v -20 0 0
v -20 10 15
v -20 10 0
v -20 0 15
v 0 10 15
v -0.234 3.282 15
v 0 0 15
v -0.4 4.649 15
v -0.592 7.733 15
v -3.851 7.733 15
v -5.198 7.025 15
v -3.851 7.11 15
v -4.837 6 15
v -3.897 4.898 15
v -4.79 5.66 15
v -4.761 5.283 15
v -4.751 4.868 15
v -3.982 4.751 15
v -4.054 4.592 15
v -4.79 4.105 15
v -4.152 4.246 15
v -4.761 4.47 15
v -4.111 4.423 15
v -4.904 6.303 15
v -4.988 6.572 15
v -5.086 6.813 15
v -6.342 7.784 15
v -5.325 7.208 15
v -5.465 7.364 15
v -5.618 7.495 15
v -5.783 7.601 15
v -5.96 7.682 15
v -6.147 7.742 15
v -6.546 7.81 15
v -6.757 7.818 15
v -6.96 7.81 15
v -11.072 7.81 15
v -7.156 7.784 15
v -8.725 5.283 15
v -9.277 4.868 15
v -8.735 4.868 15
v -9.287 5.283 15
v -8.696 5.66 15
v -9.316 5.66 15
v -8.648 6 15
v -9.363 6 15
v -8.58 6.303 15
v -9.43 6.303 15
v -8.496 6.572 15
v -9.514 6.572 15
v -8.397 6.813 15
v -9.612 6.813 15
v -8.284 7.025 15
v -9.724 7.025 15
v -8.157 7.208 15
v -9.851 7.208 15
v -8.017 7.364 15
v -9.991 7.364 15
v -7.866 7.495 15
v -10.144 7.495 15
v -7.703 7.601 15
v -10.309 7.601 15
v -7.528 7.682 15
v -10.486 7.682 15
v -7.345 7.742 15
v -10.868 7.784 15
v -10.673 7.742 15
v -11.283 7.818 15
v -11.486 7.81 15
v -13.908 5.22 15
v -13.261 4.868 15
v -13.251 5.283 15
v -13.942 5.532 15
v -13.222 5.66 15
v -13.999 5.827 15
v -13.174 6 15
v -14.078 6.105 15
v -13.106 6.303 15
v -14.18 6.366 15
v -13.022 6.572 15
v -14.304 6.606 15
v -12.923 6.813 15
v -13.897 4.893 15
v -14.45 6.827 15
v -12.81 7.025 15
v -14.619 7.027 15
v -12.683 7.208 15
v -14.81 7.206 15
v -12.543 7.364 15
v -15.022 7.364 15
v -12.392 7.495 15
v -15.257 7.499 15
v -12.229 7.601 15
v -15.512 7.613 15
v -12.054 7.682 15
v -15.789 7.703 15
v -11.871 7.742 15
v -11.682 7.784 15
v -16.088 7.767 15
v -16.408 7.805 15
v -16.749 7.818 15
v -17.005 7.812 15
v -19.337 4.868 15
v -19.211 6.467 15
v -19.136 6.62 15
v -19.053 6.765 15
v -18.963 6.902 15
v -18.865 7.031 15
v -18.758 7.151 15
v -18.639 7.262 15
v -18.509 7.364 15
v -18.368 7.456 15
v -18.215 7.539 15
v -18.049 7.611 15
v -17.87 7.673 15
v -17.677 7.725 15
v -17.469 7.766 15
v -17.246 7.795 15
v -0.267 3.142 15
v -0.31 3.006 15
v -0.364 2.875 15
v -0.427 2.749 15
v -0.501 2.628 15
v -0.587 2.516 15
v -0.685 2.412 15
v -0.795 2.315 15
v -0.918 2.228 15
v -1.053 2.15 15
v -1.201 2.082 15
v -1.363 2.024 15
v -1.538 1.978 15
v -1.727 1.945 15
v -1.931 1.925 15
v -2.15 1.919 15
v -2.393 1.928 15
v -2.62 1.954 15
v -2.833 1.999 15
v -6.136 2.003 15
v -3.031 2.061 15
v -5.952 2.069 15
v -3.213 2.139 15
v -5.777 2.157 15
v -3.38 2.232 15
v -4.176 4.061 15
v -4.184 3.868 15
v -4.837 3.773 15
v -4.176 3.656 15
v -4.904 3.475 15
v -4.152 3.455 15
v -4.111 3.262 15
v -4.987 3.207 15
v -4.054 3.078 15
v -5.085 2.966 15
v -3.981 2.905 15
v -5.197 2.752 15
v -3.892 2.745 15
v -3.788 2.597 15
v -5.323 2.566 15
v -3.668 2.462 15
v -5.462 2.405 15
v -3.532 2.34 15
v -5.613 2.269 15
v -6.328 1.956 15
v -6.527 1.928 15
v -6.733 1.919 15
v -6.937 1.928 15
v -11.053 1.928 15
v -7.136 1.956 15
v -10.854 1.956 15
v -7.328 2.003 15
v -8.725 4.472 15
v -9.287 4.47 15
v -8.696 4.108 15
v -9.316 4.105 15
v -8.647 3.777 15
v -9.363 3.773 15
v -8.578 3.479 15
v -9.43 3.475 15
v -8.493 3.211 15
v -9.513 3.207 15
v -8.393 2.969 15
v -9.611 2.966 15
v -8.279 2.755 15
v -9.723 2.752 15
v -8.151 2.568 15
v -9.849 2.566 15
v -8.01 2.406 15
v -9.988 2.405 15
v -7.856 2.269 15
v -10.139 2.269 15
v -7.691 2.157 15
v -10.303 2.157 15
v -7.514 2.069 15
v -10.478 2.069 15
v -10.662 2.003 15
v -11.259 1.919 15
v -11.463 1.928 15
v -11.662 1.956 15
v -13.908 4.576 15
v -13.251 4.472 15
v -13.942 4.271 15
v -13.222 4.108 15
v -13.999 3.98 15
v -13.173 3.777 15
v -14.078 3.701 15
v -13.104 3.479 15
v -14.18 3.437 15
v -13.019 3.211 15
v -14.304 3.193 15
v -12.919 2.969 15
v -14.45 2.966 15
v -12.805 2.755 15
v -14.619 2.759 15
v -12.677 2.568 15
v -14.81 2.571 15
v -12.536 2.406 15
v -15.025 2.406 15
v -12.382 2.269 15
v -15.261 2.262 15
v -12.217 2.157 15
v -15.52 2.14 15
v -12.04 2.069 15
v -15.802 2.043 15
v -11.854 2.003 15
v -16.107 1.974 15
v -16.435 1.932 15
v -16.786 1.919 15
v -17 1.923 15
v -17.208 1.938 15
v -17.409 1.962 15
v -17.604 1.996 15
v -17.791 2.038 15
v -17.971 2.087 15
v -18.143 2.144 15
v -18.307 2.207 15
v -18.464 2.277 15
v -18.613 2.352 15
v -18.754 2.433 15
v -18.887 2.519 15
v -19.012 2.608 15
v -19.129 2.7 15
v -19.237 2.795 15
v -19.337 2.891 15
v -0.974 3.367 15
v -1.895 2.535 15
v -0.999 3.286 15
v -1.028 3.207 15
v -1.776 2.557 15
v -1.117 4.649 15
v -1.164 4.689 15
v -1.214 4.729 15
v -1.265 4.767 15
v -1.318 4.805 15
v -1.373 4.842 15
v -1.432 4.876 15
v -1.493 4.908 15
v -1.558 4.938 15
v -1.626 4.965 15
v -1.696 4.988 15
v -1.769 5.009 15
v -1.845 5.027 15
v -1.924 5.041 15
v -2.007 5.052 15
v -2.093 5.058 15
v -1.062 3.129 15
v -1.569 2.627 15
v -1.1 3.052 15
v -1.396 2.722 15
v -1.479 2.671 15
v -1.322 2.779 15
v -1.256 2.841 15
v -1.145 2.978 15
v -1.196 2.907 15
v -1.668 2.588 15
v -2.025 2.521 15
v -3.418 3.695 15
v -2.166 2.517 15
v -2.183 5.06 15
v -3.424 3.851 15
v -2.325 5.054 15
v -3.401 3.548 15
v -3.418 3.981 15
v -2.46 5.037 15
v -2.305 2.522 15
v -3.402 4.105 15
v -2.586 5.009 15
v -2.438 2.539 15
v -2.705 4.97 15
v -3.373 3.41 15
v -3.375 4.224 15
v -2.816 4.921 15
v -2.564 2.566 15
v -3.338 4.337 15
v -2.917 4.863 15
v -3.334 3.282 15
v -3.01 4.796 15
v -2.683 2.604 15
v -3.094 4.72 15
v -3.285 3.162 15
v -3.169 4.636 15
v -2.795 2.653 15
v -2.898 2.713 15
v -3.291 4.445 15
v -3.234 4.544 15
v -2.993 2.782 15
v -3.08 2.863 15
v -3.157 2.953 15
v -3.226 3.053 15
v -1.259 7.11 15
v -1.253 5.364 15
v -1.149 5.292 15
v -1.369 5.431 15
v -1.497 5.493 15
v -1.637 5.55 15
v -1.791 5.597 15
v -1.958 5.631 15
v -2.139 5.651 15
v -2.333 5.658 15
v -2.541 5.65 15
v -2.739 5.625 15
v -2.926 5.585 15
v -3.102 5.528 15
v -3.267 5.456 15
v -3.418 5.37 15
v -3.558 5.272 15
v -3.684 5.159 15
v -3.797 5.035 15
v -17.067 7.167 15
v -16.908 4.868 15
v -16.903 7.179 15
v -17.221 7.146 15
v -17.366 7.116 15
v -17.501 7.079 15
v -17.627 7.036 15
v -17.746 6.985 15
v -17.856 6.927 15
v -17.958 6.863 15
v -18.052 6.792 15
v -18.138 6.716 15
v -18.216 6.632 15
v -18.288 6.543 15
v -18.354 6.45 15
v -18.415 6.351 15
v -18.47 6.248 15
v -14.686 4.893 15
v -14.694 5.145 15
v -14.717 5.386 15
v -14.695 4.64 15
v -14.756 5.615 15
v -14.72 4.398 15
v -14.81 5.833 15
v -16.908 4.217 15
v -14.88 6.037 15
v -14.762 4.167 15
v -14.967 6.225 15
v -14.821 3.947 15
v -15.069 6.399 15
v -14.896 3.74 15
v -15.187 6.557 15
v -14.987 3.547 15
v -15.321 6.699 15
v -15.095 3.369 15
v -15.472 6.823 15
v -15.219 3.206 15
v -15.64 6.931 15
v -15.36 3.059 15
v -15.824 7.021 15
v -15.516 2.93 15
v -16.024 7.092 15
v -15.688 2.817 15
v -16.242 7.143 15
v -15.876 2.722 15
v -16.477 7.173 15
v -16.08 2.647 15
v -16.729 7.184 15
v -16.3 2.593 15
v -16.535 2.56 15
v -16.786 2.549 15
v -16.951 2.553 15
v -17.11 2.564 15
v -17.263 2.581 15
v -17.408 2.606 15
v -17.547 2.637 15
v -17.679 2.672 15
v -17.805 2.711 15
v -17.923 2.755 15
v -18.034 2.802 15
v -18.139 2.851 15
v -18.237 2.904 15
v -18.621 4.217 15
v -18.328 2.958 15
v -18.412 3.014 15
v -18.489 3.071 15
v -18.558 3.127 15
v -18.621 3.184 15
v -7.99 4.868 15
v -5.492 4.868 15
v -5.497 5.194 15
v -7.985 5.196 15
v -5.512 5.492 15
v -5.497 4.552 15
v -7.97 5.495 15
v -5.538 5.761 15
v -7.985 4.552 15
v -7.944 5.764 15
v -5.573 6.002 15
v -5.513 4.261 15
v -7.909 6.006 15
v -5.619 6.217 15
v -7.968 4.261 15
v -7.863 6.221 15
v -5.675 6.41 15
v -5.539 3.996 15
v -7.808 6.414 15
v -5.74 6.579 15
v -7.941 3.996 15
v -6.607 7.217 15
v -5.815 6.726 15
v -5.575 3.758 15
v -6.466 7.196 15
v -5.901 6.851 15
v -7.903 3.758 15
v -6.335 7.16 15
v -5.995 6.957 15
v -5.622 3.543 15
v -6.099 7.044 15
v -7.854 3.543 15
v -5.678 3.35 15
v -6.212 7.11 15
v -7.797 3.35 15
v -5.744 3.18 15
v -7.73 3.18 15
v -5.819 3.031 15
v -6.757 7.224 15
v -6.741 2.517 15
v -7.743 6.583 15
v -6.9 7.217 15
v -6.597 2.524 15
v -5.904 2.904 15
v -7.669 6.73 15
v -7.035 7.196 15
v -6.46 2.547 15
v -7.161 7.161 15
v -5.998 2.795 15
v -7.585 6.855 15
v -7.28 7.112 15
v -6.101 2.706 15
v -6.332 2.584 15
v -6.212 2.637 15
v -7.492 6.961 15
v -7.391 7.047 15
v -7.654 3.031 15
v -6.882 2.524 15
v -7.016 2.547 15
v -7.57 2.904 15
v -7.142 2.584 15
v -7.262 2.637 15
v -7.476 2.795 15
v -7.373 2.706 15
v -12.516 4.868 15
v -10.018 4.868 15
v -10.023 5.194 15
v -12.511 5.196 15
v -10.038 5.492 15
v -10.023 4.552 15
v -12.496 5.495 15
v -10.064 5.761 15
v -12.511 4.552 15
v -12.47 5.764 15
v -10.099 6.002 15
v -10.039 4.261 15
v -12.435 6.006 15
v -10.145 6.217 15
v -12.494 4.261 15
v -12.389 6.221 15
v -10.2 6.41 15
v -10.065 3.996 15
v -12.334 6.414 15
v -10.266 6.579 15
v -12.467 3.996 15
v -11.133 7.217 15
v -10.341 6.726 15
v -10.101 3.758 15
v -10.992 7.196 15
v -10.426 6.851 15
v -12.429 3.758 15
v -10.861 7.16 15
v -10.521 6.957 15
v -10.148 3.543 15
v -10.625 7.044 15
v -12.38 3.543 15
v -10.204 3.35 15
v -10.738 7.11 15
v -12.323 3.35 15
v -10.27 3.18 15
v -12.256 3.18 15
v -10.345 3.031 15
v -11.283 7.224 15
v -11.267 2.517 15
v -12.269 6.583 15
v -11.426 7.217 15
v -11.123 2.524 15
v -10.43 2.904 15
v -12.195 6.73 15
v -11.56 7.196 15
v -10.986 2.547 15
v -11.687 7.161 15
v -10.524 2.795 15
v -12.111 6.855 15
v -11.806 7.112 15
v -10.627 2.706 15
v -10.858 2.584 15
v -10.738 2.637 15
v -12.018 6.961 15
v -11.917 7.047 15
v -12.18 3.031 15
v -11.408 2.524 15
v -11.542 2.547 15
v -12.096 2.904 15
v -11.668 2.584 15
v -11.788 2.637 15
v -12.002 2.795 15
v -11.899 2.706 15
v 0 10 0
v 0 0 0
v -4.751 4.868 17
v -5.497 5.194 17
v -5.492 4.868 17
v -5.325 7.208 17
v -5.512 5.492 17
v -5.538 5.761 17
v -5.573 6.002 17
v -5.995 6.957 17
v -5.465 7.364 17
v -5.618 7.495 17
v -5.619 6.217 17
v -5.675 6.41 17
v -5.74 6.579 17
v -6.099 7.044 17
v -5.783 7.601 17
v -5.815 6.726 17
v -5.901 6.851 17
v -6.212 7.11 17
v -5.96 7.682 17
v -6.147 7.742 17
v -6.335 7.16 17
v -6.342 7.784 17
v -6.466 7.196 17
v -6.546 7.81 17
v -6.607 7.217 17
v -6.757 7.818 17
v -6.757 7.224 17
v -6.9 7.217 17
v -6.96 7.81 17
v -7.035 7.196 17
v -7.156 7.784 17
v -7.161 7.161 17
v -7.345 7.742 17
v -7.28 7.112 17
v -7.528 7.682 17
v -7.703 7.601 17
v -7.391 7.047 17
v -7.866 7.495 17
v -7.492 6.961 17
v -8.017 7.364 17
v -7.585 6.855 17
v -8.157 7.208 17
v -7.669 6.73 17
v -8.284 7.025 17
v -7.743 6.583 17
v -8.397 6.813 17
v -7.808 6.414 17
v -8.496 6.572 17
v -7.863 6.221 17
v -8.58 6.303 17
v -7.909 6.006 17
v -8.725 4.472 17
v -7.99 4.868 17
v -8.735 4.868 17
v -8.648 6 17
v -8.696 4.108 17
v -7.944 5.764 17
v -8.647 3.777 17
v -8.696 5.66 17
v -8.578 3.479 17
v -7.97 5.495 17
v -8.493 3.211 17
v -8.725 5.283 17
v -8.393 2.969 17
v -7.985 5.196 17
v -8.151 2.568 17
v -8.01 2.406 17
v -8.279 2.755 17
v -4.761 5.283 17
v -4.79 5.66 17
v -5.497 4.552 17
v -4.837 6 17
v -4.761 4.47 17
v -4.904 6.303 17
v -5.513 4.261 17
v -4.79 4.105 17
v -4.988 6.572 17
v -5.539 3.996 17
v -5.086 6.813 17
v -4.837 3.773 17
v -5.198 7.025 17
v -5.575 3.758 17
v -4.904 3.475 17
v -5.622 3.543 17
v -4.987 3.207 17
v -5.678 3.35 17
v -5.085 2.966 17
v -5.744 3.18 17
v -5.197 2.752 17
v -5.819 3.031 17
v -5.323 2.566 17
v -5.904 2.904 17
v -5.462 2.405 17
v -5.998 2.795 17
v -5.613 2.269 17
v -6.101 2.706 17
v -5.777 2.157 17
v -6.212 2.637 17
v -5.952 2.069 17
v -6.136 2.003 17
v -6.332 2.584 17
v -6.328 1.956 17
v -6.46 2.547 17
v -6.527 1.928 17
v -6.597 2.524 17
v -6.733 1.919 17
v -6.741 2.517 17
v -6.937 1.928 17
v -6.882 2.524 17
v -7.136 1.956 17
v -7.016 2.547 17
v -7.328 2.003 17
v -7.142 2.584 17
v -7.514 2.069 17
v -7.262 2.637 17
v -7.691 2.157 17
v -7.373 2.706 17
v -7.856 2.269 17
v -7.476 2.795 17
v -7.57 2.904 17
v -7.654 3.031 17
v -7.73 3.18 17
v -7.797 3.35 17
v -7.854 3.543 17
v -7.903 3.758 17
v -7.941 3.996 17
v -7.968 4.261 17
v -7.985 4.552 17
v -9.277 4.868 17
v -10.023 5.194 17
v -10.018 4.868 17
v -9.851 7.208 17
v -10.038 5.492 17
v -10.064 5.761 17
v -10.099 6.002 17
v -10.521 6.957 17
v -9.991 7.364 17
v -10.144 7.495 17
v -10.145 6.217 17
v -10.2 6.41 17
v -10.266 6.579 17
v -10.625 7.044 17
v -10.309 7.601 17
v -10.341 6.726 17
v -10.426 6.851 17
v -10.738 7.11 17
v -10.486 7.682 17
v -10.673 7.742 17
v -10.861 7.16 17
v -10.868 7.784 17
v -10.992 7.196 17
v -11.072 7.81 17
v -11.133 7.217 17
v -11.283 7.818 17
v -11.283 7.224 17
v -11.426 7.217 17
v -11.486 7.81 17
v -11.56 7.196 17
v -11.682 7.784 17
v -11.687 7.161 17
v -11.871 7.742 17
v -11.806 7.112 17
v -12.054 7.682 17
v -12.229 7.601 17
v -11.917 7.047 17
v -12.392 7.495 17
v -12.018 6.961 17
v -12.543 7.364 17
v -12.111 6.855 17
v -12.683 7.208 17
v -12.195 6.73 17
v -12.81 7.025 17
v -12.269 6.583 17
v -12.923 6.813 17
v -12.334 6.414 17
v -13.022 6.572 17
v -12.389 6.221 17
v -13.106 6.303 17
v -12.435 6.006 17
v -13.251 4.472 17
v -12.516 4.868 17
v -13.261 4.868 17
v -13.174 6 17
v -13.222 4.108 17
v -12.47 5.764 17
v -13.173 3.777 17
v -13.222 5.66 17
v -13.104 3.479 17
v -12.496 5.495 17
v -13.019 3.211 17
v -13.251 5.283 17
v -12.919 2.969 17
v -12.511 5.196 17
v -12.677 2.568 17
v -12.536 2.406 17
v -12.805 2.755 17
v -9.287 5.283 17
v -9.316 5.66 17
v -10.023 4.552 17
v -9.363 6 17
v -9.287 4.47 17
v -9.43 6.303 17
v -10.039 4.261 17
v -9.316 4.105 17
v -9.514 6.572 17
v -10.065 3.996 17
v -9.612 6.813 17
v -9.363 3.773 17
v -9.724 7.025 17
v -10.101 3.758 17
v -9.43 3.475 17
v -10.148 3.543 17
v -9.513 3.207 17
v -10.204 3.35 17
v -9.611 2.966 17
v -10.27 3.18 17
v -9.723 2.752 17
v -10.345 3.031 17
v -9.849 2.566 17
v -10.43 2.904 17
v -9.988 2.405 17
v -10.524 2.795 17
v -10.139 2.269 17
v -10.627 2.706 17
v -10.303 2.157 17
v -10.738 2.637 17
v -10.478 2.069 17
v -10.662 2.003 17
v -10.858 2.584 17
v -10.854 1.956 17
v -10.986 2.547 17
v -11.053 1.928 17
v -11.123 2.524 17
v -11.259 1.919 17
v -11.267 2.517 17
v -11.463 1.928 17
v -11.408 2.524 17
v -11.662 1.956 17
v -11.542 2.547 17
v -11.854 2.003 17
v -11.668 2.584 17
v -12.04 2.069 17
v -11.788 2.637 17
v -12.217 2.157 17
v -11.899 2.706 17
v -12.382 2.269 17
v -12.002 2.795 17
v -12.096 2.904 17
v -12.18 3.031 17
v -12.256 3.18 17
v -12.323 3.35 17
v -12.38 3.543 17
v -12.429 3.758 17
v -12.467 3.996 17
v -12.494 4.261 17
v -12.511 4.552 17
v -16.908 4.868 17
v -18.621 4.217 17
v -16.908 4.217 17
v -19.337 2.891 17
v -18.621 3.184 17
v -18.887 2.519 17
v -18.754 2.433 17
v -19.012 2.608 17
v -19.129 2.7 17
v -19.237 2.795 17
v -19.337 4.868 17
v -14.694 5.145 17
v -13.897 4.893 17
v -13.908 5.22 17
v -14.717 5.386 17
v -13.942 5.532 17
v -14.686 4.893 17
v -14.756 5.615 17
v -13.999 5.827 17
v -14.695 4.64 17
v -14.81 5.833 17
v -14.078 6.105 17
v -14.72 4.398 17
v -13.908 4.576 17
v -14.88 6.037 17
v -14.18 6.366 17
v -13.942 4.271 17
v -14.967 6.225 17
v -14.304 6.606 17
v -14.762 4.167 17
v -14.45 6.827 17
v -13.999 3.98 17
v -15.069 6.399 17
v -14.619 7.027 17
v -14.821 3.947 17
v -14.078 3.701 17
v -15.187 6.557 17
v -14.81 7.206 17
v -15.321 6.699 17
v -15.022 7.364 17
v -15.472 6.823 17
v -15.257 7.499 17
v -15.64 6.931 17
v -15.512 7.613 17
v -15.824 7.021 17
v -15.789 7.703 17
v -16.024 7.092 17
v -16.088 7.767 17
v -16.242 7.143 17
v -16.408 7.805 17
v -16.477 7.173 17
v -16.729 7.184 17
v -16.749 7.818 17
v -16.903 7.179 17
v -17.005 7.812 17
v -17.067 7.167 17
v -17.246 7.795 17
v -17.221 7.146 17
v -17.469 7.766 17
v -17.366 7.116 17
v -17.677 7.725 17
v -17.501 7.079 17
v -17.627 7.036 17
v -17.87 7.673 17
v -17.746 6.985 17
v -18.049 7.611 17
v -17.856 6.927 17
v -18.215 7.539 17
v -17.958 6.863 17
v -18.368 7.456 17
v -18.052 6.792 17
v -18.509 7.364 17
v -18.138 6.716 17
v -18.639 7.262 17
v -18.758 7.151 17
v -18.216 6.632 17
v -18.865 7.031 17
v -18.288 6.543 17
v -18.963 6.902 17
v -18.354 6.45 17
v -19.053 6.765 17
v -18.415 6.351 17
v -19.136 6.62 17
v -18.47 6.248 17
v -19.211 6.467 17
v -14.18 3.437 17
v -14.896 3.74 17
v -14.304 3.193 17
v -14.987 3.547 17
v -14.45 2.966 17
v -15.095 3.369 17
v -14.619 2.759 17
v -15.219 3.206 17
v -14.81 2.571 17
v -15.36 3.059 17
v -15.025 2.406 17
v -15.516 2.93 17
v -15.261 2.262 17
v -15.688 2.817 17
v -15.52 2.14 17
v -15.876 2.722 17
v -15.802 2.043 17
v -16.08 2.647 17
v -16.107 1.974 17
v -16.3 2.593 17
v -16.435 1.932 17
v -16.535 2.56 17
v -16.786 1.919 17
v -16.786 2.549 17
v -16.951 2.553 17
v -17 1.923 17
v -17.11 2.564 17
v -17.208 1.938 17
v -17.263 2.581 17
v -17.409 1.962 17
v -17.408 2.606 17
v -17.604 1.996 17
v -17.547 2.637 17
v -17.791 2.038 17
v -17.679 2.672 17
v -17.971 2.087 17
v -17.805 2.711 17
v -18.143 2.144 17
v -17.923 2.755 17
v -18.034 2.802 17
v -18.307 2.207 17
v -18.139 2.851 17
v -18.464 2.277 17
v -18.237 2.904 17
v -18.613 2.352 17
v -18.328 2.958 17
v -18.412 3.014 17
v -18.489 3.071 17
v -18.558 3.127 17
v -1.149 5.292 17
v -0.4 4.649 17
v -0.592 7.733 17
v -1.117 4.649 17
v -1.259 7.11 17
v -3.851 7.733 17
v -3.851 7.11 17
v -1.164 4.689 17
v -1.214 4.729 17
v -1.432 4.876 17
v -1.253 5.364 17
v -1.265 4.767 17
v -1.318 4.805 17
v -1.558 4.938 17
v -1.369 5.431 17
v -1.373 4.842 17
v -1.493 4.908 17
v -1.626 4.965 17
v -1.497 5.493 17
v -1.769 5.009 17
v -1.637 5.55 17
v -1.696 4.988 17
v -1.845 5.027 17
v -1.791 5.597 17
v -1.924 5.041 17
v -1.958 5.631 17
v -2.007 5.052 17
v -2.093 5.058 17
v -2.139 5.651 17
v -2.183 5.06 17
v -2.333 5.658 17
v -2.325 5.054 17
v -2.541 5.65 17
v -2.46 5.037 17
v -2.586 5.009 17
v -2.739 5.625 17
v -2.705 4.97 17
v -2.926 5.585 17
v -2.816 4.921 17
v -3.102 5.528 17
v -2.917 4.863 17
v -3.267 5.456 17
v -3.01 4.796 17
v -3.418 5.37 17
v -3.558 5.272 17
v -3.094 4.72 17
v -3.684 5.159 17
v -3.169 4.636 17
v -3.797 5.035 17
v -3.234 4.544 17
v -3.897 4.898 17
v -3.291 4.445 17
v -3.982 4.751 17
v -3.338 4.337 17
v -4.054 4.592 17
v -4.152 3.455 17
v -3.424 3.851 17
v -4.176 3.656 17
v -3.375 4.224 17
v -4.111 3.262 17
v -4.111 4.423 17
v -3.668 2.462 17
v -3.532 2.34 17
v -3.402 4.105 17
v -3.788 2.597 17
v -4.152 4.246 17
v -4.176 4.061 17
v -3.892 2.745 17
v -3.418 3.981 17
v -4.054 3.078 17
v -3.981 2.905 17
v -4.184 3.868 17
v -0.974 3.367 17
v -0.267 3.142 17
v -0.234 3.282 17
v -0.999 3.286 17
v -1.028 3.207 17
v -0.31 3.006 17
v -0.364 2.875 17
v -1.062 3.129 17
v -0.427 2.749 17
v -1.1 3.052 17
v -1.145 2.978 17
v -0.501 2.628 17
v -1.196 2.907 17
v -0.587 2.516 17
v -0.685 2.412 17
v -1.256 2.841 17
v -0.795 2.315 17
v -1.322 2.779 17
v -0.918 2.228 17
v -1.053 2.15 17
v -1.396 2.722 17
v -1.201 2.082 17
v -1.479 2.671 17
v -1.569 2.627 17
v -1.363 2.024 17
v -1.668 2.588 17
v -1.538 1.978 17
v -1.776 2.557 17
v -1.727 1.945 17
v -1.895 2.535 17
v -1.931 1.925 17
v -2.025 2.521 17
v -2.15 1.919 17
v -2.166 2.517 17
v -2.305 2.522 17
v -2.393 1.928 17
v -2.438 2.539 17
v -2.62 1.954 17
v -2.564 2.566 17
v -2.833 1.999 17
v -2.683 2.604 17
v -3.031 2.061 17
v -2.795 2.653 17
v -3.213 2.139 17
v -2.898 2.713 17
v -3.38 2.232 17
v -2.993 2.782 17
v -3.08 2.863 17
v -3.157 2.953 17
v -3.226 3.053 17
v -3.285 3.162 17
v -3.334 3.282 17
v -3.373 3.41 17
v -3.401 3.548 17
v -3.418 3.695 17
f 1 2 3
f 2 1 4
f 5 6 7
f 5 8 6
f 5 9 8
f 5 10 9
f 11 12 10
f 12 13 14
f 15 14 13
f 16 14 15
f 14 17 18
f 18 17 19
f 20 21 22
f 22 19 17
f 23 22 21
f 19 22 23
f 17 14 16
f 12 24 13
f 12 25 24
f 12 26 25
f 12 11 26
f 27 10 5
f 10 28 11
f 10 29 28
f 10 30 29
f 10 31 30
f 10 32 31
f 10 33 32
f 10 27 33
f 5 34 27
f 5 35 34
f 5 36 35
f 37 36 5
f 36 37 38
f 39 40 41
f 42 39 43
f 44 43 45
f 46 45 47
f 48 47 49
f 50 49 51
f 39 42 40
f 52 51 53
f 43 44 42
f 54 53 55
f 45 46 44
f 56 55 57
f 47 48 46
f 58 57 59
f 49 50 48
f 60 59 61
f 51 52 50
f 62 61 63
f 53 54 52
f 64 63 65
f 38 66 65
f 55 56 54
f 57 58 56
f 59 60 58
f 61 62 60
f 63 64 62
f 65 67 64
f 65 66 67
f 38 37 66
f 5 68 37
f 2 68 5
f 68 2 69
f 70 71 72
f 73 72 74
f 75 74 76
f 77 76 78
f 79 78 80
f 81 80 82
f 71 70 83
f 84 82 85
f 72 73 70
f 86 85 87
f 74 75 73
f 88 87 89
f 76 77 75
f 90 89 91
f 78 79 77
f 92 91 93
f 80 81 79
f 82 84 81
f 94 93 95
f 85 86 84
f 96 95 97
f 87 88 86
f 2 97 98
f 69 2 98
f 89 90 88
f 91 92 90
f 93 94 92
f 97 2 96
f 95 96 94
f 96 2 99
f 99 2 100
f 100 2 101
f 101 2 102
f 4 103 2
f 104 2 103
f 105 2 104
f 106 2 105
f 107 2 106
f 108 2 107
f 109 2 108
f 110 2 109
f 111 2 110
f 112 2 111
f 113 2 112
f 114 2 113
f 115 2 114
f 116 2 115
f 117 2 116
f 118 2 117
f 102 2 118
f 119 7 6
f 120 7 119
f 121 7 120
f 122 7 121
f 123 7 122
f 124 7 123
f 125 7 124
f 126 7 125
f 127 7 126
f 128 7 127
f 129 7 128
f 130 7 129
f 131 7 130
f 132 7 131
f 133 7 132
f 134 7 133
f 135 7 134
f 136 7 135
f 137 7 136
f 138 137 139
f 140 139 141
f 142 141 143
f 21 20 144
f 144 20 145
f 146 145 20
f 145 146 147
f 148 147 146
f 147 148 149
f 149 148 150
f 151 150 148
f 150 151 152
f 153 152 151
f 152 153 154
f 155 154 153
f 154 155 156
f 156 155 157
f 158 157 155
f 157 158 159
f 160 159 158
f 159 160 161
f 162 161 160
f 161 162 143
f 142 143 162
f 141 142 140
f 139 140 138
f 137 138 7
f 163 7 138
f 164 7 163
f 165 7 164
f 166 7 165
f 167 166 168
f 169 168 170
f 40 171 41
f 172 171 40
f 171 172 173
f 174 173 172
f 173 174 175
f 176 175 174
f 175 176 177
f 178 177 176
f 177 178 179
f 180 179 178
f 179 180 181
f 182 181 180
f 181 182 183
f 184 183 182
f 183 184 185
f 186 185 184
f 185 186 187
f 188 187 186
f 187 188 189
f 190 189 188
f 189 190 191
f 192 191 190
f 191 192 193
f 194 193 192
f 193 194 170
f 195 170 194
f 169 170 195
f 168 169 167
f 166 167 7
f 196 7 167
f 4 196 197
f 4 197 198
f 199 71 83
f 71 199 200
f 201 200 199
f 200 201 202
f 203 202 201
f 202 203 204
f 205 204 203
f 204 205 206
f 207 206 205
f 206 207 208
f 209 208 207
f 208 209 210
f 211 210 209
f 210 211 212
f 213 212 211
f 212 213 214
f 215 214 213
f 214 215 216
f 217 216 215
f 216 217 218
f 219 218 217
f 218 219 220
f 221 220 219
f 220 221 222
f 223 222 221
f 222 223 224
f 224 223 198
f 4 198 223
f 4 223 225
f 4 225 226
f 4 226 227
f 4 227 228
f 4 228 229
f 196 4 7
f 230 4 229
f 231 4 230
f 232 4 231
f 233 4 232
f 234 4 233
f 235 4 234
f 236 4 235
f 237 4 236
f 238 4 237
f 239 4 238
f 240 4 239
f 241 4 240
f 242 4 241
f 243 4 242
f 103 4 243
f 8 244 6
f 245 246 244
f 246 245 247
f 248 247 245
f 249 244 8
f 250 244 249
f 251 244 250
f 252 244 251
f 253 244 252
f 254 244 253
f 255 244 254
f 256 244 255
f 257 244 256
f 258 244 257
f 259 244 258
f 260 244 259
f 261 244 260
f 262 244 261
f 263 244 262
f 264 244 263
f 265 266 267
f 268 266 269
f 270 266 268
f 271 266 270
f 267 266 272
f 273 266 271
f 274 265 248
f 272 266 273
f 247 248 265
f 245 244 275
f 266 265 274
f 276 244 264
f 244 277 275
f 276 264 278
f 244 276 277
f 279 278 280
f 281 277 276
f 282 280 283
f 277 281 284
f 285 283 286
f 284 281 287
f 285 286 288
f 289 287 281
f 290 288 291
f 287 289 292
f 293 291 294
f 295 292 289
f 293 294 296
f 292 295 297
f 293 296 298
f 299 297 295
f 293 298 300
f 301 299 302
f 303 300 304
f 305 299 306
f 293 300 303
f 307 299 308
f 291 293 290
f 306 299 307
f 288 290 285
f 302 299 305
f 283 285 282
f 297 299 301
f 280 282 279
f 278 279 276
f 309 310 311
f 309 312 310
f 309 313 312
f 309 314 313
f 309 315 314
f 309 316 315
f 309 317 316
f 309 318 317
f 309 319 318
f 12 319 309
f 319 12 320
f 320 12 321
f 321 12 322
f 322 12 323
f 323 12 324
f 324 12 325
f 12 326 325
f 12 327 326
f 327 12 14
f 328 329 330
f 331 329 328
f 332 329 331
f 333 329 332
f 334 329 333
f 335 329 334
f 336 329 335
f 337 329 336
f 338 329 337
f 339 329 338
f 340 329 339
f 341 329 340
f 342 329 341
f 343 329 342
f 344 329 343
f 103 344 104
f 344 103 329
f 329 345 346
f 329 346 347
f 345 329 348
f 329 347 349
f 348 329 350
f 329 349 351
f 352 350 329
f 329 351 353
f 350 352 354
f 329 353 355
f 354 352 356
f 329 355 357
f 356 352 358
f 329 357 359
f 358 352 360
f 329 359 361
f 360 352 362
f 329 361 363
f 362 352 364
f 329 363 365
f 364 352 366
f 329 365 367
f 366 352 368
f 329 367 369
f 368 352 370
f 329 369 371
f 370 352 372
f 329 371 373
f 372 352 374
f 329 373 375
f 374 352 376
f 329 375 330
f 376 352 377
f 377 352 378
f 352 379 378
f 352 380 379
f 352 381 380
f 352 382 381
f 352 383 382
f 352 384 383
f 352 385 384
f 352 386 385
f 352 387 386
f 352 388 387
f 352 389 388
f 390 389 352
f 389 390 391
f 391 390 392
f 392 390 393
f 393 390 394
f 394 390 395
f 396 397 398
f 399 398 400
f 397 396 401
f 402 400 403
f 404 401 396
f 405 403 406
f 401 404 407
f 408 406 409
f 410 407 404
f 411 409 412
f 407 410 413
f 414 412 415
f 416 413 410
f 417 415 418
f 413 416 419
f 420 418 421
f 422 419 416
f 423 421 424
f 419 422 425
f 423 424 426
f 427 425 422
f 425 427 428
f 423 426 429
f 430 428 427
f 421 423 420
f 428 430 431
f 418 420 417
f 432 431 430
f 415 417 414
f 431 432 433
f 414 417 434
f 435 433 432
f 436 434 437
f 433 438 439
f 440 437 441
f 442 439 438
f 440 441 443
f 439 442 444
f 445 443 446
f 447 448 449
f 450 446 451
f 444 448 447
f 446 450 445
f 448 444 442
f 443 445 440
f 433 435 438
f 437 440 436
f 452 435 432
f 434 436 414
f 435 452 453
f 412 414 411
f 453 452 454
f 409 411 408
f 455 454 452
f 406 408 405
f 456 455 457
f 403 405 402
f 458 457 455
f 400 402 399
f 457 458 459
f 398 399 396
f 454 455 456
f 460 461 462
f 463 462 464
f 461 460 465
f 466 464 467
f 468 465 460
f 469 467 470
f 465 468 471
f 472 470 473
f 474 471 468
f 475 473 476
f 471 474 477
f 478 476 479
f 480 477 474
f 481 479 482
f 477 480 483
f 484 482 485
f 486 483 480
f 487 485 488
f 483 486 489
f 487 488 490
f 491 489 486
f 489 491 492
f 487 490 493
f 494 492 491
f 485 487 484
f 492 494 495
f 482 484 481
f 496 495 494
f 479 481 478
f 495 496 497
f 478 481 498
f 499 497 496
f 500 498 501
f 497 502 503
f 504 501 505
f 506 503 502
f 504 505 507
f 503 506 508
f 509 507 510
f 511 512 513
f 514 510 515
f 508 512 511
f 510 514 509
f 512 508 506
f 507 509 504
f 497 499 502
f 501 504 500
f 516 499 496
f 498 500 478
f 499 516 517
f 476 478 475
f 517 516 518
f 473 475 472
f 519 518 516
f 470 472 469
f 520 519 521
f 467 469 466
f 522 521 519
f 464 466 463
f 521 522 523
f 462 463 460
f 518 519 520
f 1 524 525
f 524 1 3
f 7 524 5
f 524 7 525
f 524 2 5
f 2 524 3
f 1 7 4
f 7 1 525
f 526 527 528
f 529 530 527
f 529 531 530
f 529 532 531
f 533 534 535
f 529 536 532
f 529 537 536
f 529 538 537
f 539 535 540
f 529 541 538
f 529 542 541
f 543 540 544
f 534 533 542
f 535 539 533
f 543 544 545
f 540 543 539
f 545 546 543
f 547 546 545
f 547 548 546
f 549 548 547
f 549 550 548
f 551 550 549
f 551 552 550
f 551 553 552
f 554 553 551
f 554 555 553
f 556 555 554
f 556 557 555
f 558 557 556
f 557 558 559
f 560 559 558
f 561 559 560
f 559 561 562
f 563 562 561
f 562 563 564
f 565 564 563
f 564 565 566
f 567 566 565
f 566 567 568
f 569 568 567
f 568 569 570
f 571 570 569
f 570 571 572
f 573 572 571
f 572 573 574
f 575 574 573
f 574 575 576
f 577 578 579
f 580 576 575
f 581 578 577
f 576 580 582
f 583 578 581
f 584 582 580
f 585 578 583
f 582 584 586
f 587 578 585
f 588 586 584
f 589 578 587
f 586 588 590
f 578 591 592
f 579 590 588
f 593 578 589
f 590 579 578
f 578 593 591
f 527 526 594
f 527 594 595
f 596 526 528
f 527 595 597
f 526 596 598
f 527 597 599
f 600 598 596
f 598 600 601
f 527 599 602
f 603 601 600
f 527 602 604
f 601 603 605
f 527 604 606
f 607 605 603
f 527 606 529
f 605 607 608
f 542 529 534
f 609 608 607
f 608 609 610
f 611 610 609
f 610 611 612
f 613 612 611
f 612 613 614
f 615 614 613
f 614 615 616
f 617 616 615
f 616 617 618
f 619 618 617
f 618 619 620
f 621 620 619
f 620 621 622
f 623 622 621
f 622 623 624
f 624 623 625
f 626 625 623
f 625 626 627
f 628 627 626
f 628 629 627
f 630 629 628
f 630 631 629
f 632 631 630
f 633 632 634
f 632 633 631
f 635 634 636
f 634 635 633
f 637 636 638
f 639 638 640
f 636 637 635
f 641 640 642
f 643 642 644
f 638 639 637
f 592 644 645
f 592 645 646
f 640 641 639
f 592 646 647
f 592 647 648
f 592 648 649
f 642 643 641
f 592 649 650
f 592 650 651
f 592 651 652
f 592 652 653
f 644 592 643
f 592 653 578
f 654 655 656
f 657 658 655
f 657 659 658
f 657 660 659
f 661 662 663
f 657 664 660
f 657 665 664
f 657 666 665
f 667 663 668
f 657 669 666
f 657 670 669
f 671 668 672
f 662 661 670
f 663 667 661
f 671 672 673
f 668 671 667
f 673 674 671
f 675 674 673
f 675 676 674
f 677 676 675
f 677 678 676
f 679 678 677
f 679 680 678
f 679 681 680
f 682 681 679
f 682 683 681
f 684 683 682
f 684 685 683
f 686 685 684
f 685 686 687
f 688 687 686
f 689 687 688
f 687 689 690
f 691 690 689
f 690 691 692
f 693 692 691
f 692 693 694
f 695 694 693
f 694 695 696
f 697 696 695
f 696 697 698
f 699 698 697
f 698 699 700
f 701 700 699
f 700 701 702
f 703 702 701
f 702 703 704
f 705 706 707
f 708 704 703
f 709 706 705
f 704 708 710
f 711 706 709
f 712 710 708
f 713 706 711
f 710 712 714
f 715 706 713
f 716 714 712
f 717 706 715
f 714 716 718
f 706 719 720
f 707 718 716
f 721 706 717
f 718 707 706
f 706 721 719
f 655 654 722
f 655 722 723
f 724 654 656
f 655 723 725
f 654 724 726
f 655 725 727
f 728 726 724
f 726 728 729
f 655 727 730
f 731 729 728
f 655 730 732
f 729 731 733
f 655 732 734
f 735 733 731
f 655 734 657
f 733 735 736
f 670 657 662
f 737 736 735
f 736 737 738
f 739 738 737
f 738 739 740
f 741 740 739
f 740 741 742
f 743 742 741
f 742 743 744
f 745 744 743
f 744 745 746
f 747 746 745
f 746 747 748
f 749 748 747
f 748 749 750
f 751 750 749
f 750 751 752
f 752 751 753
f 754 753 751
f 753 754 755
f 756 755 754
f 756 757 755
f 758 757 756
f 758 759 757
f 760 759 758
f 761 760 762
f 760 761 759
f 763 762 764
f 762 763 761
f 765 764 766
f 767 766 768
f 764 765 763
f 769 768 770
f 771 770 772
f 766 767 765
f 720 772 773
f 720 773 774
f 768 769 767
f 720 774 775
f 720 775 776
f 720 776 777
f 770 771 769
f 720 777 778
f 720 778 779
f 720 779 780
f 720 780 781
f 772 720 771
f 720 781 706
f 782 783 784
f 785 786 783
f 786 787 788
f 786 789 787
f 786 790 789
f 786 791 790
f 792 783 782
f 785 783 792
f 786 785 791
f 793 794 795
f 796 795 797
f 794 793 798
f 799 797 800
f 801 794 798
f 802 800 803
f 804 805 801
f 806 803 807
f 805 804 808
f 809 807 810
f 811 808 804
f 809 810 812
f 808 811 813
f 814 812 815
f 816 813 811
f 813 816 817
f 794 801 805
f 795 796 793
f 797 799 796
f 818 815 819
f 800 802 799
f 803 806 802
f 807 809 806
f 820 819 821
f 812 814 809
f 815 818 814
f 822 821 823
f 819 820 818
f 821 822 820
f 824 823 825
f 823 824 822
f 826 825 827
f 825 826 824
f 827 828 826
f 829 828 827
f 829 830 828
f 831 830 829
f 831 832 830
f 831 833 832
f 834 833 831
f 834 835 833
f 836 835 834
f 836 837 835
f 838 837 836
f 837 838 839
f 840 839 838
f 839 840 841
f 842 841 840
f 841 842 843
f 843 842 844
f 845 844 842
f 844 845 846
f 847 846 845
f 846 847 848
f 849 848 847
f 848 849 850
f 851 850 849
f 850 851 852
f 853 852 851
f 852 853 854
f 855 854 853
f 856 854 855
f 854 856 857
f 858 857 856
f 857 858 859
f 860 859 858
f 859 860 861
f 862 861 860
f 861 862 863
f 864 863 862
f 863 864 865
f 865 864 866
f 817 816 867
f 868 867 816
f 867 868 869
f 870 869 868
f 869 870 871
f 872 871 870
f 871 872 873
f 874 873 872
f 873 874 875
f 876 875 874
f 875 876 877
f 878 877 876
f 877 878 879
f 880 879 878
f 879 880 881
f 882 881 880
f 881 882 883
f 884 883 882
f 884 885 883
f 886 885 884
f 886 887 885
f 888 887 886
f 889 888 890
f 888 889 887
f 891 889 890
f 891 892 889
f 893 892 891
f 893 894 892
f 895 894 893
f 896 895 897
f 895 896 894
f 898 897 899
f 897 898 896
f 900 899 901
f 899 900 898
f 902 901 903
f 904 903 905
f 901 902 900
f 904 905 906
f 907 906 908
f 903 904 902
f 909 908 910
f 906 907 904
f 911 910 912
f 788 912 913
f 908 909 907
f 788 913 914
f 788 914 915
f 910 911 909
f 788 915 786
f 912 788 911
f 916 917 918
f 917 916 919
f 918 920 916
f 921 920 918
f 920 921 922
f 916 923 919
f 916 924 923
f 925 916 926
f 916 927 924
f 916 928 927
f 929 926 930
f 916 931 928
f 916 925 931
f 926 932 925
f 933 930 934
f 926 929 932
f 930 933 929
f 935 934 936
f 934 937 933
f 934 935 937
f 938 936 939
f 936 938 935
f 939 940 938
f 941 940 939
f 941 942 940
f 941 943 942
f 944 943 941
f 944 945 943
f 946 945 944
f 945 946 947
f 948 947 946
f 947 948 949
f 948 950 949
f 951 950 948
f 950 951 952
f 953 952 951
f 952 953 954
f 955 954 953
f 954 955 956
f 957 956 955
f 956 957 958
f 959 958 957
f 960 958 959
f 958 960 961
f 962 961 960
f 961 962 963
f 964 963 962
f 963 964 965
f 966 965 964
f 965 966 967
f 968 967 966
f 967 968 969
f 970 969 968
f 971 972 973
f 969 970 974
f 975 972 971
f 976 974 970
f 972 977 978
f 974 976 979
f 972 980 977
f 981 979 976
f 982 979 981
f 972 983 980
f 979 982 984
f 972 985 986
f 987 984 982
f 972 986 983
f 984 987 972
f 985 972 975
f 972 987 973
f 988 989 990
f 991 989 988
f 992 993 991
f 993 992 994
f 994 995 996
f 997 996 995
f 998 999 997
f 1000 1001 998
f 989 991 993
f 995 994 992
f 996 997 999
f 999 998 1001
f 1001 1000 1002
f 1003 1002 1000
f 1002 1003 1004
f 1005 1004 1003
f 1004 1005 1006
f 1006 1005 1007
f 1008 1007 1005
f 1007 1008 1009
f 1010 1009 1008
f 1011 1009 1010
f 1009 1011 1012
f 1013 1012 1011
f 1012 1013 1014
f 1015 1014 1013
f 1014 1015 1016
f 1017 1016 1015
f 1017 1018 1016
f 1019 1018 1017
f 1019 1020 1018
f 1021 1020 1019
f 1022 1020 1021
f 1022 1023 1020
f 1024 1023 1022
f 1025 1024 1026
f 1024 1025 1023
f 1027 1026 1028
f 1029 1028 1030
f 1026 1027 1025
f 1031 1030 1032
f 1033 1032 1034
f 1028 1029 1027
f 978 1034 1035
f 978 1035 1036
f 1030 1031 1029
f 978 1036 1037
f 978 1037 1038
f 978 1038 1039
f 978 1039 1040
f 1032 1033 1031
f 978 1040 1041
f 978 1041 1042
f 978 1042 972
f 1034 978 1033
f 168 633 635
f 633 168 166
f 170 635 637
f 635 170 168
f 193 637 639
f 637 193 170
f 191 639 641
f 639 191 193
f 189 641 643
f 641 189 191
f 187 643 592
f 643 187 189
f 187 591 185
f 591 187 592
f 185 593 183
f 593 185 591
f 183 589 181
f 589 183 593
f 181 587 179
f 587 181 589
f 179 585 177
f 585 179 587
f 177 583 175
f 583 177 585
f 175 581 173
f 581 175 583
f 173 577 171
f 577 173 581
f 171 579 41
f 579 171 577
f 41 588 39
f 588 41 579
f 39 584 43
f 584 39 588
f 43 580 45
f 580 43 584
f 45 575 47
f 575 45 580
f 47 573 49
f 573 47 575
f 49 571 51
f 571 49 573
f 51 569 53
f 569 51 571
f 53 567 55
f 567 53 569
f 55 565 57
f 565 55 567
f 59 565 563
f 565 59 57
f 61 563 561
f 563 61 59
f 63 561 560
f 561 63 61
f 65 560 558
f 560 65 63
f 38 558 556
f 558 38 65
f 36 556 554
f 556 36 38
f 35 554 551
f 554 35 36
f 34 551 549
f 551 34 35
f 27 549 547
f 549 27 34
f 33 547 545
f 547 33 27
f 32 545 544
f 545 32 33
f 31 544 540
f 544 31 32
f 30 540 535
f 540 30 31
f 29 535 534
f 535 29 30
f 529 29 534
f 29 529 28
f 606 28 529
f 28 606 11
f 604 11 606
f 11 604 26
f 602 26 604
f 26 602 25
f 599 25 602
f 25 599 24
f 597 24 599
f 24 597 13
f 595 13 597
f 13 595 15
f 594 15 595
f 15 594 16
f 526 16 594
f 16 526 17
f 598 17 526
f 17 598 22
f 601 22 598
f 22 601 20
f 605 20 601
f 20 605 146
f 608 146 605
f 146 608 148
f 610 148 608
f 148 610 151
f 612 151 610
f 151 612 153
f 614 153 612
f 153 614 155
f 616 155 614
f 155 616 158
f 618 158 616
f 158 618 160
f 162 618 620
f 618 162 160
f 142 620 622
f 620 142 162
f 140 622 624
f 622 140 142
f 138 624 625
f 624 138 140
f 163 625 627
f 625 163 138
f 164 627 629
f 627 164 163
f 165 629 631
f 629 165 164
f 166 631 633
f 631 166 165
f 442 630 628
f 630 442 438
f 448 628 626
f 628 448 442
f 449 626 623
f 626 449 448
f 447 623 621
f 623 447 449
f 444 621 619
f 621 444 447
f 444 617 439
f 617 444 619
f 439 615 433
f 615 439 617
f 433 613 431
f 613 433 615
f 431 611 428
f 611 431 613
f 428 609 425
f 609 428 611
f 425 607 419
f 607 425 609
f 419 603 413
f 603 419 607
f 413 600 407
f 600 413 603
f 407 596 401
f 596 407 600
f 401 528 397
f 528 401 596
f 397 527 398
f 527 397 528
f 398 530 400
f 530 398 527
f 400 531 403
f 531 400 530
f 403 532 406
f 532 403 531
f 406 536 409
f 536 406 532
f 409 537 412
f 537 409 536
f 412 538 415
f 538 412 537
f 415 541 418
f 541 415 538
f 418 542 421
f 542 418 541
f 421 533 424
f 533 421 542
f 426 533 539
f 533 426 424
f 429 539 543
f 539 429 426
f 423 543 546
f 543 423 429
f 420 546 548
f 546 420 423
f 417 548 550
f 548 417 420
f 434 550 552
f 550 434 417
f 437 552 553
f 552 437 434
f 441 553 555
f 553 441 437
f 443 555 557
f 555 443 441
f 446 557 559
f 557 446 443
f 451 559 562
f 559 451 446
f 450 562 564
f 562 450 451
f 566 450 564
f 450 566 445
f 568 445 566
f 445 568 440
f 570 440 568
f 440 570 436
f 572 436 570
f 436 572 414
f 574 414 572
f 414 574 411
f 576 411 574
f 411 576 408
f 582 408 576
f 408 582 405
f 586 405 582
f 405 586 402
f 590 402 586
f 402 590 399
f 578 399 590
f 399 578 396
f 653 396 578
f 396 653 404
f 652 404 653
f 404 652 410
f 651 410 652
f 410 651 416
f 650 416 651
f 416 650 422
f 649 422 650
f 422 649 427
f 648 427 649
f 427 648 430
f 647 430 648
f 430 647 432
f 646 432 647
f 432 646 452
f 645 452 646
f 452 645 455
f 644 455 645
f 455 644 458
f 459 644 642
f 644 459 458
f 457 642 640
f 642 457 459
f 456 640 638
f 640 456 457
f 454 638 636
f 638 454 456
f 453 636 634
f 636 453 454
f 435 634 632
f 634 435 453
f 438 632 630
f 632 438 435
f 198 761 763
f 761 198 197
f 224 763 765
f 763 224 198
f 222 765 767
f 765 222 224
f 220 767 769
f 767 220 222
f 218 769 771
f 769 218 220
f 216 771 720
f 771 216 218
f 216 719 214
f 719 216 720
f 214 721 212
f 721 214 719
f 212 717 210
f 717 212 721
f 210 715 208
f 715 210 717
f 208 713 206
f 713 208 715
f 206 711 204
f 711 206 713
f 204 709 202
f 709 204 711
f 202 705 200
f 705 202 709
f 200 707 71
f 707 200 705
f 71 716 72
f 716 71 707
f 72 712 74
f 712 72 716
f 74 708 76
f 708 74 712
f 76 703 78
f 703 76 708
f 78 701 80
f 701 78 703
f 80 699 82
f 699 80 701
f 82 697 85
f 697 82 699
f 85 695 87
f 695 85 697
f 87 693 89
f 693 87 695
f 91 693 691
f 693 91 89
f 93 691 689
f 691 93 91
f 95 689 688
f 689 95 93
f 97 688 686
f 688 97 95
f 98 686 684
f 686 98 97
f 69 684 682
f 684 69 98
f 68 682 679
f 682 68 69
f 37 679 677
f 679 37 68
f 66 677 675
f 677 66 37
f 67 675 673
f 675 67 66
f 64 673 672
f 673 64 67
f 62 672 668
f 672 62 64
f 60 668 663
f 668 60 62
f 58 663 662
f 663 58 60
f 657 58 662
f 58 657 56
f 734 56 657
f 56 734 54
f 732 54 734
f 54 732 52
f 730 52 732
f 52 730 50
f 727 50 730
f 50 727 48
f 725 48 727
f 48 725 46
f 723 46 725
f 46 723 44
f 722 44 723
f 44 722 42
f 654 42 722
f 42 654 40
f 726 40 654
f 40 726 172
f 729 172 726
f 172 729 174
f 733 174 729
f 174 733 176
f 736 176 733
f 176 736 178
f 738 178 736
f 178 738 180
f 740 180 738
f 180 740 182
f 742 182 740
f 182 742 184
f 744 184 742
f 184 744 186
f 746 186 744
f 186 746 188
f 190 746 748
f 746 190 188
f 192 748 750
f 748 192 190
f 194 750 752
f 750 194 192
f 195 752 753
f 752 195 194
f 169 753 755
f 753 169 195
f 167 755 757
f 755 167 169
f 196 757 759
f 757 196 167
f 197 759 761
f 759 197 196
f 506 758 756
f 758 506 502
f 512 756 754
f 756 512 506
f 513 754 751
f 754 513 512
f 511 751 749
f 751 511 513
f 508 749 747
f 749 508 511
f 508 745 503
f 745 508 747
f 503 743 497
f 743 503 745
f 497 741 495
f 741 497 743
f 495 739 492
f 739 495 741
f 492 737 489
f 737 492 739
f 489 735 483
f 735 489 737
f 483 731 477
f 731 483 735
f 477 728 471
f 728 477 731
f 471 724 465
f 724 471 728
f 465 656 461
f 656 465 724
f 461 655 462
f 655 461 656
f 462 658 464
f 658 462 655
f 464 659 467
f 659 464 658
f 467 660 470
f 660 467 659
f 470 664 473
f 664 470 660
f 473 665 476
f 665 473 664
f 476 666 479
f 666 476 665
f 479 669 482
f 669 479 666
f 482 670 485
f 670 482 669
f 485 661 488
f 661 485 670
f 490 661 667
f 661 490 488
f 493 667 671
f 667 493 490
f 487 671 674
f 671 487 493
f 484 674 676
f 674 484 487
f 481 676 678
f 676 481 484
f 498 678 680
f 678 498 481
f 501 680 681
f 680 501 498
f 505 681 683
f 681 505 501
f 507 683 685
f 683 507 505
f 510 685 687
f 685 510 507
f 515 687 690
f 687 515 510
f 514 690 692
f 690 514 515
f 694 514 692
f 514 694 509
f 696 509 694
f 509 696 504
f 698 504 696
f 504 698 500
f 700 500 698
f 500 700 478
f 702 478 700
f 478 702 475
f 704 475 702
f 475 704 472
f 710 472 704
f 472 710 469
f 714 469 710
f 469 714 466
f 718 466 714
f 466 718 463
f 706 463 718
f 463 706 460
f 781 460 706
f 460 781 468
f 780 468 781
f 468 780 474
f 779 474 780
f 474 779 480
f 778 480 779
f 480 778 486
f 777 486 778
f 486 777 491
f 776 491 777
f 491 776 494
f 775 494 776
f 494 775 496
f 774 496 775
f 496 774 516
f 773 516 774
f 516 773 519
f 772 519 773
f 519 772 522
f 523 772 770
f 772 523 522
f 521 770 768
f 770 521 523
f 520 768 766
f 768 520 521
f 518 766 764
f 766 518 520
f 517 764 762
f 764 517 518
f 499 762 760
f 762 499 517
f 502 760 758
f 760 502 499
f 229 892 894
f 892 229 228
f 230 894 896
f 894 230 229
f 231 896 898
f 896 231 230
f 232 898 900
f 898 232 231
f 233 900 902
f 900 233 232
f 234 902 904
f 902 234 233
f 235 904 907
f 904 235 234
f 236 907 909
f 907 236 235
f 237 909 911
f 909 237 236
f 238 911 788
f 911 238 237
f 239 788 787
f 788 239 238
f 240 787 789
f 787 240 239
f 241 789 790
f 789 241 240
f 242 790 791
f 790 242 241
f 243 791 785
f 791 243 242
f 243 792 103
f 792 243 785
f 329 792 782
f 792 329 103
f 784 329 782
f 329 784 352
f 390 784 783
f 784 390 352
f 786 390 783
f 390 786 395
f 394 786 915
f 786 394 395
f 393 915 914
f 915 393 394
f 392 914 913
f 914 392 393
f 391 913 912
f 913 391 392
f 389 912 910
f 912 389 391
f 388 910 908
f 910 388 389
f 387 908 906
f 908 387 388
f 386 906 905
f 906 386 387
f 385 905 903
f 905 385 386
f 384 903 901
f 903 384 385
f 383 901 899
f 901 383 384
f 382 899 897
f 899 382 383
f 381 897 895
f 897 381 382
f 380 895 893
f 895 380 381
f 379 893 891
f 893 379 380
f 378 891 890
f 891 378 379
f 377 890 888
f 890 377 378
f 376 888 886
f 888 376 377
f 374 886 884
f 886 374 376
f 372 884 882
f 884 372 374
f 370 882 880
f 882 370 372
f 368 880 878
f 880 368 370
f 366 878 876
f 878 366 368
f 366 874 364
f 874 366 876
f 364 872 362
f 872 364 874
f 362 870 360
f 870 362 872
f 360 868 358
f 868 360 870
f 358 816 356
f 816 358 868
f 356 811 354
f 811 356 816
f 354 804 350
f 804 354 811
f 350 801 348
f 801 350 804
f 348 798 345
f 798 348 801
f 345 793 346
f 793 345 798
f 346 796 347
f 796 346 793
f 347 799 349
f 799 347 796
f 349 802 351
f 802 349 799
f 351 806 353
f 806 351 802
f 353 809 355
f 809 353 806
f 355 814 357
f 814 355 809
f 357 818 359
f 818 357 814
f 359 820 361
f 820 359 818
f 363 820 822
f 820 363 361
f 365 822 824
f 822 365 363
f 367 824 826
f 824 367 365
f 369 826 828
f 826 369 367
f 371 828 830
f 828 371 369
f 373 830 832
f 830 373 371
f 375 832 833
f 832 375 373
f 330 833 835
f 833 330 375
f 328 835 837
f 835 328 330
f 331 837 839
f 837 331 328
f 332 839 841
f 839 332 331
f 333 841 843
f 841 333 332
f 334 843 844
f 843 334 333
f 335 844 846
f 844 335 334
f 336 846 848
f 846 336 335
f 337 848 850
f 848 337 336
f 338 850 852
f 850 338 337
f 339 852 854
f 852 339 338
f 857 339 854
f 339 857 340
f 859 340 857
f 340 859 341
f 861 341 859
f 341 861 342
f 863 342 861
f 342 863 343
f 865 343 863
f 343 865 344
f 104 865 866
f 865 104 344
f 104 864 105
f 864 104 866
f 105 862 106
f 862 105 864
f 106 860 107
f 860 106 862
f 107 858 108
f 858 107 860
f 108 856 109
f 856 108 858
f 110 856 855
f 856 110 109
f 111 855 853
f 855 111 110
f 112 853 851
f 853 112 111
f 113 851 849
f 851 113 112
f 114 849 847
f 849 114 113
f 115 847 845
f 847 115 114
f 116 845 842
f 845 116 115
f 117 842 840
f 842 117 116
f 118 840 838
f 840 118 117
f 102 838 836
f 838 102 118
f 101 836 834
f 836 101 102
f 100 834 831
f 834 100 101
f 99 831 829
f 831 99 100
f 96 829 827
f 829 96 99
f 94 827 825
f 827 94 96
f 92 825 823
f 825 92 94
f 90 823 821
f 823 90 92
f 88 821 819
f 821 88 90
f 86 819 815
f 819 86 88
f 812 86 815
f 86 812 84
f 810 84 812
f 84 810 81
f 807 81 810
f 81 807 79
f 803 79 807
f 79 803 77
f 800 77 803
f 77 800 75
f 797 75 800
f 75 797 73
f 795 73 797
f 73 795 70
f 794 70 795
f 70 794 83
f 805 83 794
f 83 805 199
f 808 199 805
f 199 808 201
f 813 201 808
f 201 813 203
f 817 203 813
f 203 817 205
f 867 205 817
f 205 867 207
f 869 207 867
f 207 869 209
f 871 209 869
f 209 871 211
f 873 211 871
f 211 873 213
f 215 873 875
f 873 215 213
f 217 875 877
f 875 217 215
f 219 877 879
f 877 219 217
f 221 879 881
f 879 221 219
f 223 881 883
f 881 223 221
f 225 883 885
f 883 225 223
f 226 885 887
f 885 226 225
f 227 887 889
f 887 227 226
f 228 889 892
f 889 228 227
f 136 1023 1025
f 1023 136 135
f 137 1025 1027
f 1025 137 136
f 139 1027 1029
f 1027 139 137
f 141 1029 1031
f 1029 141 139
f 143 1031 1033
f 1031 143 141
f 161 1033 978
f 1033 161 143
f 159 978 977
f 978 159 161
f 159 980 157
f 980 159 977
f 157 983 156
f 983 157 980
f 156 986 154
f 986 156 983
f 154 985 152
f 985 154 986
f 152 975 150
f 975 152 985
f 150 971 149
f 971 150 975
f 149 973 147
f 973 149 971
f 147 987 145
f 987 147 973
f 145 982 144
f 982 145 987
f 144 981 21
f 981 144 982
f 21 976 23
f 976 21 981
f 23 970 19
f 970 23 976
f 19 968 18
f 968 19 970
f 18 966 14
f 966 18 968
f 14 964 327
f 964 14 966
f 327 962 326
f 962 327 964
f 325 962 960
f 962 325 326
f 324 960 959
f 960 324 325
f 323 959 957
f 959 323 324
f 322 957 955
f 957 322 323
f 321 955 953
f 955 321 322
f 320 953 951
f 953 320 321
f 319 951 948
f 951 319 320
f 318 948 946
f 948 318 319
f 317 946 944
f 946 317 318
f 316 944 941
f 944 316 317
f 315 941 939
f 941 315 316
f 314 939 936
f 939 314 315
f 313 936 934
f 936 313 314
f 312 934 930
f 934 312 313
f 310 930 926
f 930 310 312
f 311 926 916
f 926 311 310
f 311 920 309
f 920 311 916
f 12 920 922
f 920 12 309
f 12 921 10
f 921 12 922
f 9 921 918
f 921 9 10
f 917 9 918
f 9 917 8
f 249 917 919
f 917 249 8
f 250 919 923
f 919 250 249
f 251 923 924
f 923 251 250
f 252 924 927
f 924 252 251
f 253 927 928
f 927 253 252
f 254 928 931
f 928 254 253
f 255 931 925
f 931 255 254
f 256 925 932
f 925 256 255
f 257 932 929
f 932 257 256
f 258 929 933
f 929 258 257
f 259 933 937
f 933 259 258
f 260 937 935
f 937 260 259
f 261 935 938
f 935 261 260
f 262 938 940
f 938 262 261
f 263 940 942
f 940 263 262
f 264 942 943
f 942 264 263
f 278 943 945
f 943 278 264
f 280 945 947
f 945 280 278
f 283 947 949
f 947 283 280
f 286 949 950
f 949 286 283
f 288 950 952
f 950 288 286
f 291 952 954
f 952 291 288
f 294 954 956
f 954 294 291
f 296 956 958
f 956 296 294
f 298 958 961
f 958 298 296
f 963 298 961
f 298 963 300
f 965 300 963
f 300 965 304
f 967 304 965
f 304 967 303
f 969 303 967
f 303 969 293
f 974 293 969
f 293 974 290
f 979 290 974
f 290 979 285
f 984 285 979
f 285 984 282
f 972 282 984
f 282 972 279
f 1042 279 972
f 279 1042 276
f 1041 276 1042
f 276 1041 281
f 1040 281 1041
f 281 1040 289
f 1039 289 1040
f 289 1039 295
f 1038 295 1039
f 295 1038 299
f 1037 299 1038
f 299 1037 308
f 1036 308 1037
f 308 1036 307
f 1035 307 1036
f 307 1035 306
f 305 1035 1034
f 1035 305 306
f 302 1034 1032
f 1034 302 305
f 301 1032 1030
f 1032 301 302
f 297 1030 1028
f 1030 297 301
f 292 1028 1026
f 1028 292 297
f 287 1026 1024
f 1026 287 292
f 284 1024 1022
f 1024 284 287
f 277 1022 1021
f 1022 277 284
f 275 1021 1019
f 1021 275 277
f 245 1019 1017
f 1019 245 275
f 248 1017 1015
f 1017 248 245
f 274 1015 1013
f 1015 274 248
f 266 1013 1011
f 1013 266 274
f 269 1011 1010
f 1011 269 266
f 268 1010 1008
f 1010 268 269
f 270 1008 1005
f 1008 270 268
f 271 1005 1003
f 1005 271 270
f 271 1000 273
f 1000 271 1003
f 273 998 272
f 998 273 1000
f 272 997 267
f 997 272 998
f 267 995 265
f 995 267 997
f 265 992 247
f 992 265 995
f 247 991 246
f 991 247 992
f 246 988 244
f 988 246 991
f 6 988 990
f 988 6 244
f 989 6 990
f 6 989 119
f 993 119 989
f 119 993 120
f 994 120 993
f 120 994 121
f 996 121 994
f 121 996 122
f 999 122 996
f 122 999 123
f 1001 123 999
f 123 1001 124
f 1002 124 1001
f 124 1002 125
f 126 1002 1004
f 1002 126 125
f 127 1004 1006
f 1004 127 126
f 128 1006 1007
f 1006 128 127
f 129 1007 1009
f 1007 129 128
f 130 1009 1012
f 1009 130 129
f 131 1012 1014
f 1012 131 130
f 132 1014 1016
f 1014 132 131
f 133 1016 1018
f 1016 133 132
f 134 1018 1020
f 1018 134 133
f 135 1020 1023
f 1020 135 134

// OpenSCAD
mirror([1, 0, 0]) {
    cube([20, 10, 15]);

    translate([-0.1, 2, 4+10]) linear_extrude(3)
        scale(0.6) text("500G");
}

//50, 20, 10, 5, 2, 1
